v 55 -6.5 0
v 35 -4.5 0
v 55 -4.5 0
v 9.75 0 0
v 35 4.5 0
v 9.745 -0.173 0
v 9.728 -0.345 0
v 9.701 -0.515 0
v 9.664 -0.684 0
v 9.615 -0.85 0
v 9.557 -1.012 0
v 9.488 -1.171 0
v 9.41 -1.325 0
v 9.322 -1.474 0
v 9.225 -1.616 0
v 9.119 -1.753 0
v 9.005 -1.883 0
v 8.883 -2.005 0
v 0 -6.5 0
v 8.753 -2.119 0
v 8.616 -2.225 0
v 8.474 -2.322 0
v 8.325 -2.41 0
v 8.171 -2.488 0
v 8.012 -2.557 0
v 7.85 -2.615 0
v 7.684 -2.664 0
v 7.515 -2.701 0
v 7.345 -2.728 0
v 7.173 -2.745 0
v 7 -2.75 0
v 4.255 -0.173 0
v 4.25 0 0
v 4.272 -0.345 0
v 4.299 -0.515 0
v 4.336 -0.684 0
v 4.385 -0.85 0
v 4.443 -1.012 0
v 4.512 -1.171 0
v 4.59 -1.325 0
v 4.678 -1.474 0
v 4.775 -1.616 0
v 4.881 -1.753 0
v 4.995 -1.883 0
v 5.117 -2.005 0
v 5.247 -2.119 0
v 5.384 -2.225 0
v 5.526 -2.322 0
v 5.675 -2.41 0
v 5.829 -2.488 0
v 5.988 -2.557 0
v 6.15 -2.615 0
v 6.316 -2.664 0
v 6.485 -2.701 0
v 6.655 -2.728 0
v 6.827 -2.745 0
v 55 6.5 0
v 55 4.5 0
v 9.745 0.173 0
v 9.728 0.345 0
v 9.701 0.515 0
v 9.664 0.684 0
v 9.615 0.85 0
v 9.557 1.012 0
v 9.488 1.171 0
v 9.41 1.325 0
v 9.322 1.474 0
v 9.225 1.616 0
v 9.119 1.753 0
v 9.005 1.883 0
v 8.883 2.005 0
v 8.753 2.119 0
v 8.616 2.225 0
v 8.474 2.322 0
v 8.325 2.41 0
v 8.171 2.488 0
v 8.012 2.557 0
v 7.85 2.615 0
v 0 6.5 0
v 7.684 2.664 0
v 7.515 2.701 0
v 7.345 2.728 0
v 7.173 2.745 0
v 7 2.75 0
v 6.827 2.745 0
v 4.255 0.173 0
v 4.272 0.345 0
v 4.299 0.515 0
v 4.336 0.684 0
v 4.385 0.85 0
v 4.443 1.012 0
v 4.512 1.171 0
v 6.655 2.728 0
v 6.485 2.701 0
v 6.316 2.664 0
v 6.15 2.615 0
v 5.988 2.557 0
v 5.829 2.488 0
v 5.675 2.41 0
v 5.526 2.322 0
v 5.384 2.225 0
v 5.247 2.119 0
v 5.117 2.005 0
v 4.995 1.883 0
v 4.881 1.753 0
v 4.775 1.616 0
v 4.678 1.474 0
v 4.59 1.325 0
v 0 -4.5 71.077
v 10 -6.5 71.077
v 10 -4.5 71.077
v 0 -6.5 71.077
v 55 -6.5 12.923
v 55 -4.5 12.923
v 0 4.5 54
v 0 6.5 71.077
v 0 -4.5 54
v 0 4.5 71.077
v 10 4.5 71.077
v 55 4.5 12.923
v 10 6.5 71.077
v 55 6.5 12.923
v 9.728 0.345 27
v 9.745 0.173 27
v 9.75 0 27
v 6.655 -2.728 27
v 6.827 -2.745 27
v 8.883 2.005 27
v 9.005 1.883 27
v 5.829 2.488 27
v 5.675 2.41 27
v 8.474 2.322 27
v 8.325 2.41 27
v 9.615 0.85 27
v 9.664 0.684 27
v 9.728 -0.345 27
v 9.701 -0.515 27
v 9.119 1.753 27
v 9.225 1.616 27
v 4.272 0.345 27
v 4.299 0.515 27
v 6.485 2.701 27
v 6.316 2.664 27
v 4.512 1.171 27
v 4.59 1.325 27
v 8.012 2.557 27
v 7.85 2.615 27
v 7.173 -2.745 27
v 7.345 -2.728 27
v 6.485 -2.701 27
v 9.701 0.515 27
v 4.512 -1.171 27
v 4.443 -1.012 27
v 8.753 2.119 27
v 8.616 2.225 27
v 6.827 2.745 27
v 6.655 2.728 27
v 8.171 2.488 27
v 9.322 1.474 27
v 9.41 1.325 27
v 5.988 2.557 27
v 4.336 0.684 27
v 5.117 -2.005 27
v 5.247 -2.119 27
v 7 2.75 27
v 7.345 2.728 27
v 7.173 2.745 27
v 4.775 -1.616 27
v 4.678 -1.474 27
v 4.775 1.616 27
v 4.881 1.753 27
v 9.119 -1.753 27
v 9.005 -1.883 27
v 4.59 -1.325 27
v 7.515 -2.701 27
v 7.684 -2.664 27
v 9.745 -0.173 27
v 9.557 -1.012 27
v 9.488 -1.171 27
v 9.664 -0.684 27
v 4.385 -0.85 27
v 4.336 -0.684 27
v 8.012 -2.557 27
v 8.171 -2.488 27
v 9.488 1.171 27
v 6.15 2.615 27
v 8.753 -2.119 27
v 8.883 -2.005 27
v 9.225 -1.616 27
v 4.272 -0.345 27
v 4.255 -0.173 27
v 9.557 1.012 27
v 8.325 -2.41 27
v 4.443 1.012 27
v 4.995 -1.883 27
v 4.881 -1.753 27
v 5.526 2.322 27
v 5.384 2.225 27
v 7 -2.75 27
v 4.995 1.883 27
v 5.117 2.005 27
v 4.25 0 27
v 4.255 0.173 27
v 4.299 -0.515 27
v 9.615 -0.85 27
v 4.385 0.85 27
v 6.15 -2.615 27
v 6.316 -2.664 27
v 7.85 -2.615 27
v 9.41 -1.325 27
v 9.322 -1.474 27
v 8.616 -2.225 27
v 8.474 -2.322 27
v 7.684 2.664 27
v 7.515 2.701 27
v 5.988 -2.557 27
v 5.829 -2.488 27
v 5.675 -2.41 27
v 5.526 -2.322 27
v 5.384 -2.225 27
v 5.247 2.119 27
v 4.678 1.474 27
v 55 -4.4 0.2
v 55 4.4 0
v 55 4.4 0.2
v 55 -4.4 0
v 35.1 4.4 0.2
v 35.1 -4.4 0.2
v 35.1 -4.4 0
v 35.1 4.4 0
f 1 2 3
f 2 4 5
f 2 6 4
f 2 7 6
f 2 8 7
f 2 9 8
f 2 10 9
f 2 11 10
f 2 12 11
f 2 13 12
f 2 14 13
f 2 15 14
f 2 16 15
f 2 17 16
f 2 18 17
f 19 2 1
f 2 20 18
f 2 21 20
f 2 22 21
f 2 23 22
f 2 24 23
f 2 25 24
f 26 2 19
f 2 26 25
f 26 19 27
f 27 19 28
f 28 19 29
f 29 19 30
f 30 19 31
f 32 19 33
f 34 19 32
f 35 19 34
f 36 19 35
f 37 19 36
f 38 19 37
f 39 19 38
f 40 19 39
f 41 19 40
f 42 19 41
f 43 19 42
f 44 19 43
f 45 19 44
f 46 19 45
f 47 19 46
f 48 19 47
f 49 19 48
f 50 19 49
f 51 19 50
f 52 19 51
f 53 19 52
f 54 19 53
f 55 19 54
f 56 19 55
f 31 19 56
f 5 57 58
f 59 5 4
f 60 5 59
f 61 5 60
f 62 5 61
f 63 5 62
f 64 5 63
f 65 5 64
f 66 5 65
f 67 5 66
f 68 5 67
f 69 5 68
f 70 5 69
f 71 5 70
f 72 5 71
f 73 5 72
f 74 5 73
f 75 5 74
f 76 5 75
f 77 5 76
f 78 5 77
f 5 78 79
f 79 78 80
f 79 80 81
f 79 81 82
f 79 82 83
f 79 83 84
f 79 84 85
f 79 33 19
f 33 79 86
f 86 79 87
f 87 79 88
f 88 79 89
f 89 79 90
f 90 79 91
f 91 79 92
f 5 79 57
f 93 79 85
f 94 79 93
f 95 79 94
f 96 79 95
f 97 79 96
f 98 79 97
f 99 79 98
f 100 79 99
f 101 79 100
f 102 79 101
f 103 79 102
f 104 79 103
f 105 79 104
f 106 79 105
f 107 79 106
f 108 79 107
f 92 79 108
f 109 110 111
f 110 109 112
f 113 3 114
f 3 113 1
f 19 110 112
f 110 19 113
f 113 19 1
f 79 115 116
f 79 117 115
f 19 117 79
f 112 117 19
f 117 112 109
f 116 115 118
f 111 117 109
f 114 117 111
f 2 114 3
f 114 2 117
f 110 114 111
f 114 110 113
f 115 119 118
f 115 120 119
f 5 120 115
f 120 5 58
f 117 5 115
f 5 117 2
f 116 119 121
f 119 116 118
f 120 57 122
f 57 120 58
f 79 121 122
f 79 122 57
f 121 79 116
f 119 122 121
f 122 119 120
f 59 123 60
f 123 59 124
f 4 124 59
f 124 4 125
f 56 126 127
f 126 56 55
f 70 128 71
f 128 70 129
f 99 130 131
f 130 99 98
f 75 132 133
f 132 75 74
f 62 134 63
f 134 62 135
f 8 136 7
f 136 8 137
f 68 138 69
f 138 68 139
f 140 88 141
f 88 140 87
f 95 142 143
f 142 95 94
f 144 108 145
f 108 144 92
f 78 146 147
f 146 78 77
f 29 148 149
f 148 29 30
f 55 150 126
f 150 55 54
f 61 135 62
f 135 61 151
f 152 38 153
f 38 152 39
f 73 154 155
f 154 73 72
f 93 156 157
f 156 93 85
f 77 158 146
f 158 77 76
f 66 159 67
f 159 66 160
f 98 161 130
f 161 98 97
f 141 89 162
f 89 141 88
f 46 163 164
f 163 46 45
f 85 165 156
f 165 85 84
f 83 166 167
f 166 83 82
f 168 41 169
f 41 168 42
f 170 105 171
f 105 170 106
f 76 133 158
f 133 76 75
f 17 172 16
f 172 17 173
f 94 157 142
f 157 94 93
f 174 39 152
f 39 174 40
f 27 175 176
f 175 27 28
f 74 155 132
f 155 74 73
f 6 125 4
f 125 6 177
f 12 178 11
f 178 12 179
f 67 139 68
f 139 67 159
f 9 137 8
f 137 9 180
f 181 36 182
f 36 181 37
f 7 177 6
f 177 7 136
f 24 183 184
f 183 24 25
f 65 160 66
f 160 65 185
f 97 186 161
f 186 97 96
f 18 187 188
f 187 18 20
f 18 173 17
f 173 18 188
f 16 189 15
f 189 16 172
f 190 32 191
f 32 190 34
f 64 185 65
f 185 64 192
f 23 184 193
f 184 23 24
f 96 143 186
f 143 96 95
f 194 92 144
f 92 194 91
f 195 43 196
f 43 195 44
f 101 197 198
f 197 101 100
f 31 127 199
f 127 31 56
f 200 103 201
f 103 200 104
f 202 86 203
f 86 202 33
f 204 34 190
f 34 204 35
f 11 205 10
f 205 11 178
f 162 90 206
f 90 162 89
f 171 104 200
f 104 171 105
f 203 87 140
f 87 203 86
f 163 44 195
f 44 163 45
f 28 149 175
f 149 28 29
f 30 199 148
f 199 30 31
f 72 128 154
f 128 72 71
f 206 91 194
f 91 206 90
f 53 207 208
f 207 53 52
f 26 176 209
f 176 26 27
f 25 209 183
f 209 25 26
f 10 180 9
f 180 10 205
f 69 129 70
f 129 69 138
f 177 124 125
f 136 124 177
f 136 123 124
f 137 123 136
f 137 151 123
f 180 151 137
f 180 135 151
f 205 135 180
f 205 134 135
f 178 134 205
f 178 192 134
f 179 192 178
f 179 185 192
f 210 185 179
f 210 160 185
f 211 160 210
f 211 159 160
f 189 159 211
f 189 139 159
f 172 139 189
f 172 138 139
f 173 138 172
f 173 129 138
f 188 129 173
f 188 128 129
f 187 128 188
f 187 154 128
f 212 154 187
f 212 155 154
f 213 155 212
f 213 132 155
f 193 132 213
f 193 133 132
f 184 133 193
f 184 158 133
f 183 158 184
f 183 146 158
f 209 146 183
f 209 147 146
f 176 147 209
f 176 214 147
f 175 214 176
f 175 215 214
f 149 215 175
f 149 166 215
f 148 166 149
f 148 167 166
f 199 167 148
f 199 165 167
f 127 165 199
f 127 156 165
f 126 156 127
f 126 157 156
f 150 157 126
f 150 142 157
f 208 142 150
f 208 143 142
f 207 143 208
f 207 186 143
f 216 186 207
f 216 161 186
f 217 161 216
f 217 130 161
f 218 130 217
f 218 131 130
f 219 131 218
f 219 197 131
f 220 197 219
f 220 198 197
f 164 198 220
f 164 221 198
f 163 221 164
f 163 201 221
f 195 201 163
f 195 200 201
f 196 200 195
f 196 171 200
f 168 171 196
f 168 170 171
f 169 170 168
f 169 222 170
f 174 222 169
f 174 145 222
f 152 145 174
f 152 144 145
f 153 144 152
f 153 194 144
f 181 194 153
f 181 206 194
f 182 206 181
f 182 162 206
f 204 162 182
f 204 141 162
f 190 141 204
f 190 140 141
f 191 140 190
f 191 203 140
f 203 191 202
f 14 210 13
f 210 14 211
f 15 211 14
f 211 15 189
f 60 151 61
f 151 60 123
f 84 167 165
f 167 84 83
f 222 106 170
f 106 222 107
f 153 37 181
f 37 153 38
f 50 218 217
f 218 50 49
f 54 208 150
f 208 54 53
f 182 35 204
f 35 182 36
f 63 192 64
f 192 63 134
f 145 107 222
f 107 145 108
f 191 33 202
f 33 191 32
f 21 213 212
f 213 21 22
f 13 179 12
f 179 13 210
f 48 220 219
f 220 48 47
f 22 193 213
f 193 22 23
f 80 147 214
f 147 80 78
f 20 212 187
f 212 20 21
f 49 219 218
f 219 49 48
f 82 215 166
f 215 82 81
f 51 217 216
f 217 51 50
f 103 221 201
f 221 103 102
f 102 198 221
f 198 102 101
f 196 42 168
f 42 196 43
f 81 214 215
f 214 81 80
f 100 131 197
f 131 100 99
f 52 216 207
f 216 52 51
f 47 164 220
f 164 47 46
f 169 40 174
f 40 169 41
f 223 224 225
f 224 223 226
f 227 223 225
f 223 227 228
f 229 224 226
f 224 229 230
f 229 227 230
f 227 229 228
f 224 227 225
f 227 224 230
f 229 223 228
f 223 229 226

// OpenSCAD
corner_length = 35;
corner_height = 54;
door_thickness = 9;
overlap_thickness = 2;
overlap_length = 30;
overlap_height = 30;
overlap_cut = 10;
hinge_diameter = 5.5;
hinge_distance = 7;
hinge_depth = corner_height / 2;
brim_height = 0.2;
brim_offset = 0.1;

$fn = 100;

module make_triangle(a, b) {
    polygon([[0, 0], [a, 0], [0, b]]);
}

module make_cut_triangle(a, b, cut_size) {
    polygon([
        [0, 0],
        [a - cut_size, 0],
        [a - cut_size, cut_size * b / a],
        [cut_size, b - cut_size * b / a],
        [0, b - cut_size * b / a]
    ]);
}

difference() {
    translate([0, (2*overlap_thickness + door_thickness)/2, 0]) rotate([90, 0, 0]) {
        translate([0, 0, overlap_thickness + door_thickness]) {
            linear_extrude(overlap_thickness) {
                make_cut_triangle(
                    corner_length + overlap_length,
                    corner_height + overlap_height,
                    overlap_cut
                );
            }
        }
        translate([0, 0, overlap_thickness]) {
            linear_extrude(door_thickness) {
                make_triangle(corner_length, corner_height);
            }
        }
        linear_extrude(overlap_thickness) {
            make_cut_triangle(
                corner_length + overlap_length,
                corner_height + overlap_height,
                overlap_cut
            );
        }
    }
    translate([hinge_distance, 0, -1]) {
        cylinder(hinge_depth+1, d=hinge_diameter);
    }
}

if (brim_height > 0) {
    translate([corner_length + brim_offset, - (door_thickness / 2) + brim_offset, 0]) {
        cube([overlap_length - brim_offset - overlap_cut, door_thickness - 2*brim_offset, brim_height]);
    }
}
